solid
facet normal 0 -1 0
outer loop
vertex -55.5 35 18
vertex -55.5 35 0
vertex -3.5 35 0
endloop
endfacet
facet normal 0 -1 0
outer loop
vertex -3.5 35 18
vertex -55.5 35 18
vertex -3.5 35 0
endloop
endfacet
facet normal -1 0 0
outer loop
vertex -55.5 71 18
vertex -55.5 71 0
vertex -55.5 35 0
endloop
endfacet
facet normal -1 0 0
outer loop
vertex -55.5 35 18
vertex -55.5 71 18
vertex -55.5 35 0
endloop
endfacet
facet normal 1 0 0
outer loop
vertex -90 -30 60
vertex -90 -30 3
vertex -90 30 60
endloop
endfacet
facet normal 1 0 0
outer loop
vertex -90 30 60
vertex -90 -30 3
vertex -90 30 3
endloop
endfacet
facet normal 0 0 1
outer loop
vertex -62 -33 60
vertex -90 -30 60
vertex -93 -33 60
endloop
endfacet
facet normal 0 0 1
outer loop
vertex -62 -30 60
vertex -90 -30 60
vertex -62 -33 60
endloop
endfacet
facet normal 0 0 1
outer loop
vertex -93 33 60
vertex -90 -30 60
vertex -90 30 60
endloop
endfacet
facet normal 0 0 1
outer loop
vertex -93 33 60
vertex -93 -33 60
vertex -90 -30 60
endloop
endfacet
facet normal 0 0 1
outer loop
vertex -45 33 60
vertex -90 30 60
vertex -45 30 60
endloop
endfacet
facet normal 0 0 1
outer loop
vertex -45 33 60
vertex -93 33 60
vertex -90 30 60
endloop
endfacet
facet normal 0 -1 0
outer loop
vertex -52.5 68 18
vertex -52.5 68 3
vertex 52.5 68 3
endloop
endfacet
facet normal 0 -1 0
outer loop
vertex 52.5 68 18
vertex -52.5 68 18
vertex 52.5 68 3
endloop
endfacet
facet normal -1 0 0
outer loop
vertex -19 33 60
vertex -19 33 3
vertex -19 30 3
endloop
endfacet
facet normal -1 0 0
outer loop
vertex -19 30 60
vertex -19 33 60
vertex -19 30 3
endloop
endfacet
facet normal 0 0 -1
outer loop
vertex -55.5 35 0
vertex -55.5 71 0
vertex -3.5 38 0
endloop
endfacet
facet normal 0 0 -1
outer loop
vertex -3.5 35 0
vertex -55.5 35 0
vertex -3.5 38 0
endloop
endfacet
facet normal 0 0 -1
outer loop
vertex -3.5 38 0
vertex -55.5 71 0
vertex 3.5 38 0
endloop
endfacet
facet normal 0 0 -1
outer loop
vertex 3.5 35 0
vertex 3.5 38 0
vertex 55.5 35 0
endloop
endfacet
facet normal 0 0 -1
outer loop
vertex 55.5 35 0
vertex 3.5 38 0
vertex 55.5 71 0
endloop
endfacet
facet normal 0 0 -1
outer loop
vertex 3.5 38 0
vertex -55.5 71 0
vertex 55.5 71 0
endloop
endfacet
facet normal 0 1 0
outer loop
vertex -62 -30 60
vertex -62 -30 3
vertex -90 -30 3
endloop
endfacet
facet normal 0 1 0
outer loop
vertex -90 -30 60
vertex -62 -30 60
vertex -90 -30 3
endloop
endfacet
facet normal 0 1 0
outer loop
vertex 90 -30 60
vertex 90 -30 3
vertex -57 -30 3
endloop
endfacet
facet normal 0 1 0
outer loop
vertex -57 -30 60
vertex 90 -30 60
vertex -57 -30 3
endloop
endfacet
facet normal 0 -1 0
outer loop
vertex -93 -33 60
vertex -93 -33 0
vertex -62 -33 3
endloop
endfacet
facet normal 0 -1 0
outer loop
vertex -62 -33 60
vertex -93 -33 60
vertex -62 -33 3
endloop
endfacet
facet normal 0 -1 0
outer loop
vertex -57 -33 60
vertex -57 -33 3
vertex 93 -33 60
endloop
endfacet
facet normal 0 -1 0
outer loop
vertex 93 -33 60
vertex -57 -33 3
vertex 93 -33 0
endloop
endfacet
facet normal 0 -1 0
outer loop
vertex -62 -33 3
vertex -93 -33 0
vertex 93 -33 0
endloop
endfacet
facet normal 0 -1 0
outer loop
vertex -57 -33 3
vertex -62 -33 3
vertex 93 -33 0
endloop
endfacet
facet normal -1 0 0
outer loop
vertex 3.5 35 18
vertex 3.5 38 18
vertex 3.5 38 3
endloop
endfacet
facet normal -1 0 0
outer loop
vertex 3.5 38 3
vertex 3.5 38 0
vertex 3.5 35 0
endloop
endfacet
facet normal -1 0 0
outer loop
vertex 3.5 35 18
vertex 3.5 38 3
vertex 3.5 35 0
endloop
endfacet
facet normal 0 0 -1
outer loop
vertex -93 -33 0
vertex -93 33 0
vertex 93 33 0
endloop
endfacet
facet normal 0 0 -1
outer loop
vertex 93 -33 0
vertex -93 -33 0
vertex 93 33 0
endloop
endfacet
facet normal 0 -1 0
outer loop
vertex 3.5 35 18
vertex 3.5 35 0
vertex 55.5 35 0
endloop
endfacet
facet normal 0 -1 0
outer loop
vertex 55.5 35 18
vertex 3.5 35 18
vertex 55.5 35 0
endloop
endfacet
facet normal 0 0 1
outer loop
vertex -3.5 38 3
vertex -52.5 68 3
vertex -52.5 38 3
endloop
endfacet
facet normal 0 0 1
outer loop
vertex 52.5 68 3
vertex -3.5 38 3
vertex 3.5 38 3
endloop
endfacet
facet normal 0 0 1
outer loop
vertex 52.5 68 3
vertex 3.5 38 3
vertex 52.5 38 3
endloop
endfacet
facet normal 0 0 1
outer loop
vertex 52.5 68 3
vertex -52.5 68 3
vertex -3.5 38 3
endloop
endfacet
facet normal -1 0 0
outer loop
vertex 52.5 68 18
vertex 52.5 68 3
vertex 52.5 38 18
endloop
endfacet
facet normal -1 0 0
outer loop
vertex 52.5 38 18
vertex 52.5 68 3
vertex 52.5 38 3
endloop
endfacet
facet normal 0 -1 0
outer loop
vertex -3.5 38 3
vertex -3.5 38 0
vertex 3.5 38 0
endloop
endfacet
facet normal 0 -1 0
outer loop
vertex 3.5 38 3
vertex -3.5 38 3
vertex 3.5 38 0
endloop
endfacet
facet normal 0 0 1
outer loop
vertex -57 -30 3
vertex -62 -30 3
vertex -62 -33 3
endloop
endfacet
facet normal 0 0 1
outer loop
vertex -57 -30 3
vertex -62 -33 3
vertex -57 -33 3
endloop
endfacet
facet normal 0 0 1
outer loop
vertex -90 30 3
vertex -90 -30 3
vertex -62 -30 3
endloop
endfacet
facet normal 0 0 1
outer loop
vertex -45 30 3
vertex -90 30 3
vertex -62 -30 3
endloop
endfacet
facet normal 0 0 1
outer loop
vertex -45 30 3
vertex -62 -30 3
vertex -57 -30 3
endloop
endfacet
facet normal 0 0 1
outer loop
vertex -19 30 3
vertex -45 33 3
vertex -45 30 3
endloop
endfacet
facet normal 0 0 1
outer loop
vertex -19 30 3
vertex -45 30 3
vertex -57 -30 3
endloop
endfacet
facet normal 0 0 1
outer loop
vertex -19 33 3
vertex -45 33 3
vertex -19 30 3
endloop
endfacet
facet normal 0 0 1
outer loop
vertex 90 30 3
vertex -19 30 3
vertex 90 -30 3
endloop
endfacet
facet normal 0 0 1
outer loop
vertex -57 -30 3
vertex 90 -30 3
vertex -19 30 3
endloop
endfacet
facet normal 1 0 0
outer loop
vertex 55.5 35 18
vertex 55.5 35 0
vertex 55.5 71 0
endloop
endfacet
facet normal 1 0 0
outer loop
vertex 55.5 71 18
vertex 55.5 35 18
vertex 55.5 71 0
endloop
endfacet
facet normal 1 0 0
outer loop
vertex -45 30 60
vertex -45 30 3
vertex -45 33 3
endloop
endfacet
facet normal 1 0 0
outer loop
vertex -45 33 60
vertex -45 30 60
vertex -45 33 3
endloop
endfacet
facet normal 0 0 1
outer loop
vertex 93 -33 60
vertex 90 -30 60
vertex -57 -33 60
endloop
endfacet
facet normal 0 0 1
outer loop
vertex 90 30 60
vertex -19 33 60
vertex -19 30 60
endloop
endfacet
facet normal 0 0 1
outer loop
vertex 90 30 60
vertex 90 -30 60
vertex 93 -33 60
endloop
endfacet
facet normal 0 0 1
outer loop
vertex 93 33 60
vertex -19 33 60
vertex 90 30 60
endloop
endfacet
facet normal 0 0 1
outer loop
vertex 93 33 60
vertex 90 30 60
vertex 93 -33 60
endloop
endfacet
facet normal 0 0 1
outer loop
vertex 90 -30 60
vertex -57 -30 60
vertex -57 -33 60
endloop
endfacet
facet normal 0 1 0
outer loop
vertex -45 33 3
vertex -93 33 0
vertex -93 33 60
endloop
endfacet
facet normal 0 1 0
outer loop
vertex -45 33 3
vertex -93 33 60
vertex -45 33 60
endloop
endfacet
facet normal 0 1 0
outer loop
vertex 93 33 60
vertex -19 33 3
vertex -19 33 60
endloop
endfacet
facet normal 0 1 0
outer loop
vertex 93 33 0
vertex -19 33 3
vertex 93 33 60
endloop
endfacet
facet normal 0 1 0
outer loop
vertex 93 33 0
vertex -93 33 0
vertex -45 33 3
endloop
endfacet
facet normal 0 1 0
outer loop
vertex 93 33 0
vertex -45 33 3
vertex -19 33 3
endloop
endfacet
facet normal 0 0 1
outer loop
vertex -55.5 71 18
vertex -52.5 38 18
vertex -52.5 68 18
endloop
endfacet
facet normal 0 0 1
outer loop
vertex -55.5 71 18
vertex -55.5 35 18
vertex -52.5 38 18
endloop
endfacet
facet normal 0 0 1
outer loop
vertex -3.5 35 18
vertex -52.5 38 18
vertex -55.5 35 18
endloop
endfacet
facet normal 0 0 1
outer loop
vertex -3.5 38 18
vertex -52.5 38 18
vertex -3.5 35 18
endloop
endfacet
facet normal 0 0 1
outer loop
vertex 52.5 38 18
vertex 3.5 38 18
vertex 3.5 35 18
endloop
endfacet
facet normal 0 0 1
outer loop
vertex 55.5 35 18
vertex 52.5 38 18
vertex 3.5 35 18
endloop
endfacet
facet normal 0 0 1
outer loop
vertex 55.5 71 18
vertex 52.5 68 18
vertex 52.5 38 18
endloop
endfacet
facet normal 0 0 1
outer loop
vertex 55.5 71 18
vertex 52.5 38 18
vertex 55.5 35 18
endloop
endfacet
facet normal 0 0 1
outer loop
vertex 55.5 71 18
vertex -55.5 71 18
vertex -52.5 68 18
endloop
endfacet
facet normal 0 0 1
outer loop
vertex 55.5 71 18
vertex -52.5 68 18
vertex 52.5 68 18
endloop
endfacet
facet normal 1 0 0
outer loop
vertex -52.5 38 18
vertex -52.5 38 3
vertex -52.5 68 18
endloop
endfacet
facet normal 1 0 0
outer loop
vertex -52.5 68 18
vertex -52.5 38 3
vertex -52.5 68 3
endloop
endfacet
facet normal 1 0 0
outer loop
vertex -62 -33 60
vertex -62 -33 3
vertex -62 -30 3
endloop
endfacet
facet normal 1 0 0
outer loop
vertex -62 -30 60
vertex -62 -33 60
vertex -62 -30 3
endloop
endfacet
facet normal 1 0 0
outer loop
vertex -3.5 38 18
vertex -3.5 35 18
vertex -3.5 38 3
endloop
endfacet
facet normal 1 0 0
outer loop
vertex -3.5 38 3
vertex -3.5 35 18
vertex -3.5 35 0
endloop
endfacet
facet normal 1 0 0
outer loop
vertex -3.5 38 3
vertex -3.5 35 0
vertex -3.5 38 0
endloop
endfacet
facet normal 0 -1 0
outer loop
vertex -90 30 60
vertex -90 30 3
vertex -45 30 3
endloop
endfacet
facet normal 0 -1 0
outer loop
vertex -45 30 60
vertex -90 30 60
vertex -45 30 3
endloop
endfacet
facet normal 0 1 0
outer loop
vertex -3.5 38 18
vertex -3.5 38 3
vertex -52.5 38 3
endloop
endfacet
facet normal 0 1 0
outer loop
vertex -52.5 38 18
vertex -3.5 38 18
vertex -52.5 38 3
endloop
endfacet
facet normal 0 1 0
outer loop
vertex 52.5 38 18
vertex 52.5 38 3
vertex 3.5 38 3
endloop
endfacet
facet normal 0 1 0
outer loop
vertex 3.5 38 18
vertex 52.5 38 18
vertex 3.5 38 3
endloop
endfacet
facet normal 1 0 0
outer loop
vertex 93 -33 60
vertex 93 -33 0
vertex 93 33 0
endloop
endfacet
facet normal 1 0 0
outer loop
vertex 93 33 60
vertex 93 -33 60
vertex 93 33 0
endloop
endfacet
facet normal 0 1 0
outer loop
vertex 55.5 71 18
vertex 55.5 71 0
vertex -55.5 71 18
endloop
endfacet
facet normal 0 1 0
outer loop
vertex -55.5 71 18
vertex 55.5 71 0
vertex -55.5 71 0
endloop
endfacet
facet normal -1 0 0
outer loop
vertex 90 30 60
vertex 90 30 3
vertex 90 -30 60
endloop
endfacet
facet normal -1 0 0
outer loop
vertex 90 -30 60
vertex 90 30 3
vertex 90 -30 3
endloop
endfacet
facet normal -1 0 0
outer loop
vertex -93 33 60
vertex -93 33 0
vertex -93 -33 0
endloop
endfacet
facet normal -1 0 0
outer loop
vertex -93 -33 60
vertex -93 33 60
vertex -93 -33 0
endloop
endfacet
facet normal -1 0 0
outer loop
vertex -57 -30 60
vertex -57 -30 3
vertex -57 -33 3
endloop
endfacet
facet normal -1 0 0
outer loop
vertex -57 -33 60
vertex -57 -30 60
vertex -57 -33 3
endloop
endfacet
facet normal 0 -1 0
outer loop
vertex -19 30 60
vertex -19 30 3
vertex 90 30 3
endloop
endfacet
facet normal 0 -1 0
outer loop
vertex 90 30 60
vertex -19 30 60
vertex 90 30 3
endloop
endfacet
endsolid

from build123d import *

# Parameters (mm, degrees)
F2_DEPTH = 3
F4_DEPTH = 18
F0_W     = 5
F0_H     = 3
F0_W_2   = 26
F5_DEPTH = 3
F7_DEPTH = 60


with BuildPart() as f2:
    # F1 (on Top) → F2 (new body)
    with BuildSketch(Plane.XY):
        Polygon((3.5, 38), (52.5, 38), (52.5, 68), (-52.5, 68), (-52.5, 38), (-3.5, 38), align=None)
    extrude(amount=F2_DEPTH)

    # F3 (on Top) → F4 (join)
    with BuildSketch(Plane.XY):
        Polygon((52.5, 68), (52.5, 38), (3.5, 38), (3.5, 35), (55.5, 35), (55.5, 71), (-55.5, 71), (-55.5, 35), (-3.5, 35), (-3.5, 38), (-52.5, 38), (-52.5, 68), align=None)
    extrude(amount=F4_DEPTH)


with BuildPart() as f5:
    # F0 (on Top) → F5 (new body)
    with BuildSketch(Plane.XY):
        Polygon((-57, -30), (90, -30), (90, 30), (-19, 30), (-45, 30), (-90, 30), (-90, -30), (-62, -30), align=None)
        with Locations((-59.5, -31.5)):
            Rectangle(F0_W, F0_H)
        with Locations((-32, 31.5)):
            Rectangle(F0_W_2, F0_H)
    extrude(amount=F5_DEPTH)

    # F6 (on Top) → F7 (join)
    with BuildSketch(Plane.XY):
        Polygon((90, 30), (90, -30), (-57, -30), (-57, -33), (93, -33), (93, 33), (-19, 33), (-19, 30), align=None)
        Polygon((-62, -33), (-62, -30), (-90, -30), (-90, 30), (-45, 30), (-45, 33), (-93, 33), (-93, -33), align=None)
    extrude(amount=F7_DEPTH)


solid = Compound([f2.part, f5.part])
